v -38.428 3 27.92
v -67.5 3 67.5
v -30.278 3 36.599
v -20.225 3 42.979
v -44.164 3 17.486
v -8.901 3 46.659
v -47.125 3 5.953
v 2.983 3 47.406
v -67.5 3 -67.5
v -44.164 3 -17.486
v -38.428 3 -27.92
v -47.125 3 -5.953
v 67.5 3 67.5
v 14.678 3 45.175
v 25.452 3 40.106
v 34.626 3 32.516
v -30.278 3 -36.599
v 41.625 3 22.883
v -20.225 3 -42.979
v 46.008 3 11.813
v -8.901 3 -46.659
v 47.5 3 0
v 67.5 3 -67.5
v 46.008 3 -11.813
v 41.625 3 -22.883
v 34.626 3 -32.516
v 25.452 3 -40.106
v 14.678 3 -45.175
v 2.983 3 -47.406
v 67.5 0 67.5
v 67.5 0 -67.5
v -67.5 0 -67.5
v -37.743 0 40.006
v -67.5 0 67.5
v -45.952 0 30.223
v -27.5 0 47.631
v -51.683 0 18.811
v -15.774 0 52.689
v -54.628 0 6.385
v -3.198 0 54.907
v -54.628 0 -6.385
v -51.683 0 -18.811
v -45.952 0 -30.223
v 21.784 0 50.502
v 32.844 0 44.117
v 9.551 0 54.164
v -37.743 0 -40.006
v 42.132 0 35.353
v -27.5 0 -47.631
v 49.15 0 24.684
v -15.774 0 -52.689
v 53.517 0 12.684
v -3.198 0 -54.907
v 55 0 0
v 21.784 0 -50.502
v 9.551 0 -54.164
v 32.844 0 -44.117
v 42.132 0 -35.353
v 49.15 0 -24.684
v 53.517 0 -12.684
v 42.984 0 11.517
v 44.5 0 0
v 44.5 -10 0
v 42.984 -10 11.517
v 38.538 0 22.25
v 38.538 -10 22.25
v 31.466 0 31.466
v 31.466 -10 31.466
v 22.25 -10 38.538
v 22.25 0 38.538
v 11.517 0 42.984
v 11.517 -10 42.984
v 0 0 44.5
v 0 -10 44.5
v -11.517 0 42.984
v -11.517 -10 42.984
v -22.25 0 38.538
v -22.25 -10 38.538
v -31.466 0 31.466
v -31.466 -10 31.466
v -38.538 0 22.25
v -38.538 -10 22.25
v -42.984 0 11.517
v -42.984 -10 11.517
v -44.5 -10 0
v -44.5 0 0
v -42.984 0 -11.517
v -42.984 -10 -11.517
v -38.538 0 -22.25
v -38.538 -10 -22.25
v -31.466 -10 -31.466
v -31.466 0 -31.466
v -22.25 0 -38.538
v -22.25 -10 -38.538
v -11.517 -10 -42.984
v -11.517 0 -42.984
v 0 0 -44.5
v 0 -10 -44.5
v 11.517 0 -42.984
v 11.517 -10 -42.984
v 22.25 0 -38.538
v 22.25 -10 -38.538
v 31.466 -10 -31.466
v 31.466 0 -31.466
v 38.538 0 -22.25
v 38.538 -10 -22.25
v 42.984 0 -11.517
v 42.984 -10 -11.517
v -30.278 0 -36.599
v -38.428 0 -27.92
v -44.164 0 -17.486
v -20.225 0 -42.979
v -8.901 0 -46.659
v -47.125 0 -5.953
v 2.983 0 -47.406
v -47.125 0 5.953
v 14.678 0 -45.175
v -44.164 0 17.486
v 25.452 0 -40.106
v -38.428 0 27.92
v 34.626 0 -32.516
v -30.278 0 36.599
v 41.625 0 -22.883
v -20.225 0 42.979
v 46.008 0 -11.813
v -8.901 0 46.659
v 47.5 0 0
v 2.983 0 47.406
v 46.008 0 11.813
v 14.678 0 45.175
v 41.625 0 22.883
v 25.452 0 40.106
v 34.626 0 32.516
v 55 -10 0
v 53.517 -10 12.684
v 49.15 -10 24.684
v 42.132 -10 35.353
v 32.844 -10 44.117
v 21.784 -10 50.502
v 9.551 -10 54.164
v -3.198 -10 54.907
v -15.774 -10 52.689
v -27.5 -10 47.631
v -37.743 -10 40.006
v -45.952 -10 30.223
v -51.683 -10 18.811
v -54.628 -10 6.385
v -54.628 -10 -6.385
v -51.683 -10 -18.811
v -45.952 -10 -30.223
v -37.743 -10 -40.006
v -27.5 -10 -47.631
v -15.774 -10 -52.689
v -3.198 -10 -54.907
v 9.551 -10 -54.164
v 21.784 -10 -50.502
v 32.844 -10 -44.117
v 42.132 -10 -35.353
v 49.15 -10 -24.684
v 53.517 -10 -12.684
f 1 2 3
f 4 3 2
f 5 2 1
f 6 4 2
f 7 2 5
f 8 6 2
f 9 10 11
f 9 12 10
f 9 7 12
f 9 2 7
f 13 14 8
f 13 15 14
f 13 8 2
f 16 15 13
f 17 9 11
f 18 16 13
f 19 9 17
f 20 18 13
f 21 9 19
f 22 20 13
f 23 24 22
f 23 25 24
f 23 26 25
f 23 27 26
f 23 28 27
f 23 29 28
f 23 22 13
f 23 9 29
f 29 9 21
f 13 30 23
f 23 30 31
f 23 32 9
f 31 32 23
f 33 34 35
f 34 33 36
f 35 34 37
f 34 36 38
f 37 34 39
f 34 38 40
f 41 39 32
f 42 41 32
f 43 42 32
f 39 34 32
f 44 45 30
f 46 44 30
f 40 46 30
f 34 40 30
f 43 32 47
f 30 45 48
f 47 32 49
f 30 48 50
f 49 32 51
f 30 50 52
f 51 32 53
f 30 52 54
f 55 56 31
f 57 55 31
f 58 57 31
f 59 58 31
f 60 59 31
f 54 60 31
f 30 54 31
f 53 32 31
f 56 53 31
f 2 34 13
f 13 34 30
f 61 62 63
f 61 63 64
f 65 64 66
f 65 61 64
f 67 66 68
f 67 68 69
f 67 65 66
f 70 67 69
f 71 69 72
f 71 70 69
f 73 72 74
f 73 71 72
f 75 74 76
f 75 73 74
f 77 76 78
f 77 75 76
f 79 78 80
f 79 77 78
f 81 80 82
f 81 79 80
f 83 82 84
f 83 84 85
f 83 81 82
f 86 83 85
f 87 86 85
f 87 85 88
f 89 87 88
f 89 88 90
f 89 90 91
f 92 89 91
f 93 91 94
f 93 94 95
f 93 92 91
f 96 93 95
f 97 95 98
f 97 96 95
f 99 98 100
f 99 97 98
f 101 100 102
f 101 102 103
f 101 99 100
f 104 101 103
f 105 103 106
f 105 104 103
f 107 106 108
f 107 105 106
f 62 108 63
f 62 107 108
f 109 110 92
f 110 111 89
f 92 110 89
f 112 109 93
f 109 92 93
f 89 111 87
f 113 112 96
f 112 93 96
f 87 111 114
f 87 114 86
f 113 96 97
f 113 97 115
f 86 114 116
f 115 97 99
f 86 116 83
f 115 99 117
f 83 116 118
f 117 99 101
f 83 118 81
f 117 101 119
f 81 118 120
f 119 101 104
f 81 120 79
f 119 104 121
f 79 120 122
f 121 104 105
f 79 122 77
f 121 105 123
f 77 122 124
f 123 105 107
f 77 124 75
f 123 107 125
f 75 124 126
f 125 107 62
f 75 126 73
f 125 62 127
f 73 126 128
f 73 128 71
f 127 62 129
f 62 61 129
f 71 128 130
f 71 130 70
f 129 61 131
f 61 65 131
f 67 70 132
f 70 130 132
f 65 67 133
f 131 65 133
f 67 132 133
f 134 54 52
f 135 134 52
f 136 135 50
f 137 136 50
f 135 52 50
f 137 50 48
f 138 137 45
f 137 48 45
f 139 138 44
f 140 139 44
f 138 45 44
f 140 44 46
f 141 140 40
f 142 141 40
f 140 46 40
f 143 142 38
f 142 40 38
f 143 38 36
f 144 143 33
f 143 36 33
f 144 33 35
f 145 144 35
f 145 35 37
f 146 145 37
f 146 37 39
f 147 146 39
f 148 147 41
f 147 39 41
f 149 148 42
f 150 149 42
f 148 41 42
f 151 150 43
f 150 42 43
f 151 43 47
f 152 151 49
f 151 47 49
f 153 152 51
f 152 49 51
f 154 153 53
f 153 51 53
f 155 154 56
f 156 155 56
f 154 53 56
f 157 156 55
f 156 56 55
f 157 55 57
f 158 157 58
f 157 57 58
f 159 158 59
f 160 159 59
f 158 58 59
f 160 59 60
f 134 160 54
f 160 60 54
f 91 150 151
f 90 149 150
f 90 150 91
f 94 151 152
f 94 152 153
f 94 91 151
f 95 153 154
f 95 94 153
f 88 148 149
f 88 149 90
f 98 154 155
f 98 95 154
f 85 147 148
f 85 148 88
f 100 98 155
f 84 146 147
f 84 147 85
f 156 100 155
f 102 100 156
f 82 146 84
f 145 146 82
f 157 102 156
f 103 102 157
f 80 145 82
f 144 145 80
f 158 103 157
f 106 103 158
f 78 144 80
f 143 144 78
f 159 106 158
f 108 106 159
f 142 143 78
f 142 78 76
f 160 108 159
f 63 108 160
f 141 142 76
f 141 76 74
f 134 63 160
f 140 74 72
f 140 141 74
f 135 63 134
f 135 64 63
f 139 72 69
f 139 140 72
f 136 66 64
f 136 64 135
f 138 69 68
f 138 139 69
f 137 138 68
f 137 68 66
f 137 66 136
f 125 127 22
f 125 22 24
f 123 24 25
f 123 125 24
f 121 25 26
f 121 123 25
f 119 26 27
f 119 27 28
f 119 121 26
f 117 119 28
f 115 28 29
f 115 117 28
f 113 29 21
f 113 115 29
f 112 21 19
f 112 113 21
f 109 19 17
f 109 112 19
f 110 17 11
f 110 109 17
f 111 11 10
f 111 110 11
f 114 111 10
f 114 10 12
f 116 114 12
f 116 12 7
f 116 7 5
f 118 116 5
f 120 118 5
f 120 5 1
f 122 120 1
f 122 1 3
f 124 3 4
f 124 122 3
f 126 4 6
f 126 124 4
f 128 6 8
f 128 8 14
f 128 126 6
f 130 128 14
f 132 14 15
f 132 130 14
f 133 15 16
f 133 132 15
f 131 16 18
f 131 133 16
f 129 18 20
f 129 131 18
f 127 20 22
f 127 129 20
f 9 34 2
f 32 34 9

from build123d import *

# Parameters (mm, degrees)
SKETCH1_W           = 135
SKETCH1_H           = 135
SKETCH1_R           = 47.5
BOSS_EXTRUDE1_DEPTH = 3
SKETCH2_R           = 55
SKETCH2_R_2         = 44.5
BOSS_EXTRUDE2_DEPTH = 10


with BuildPart() as part:
    # Sketch1 → Boss-Extrude1 (new body)
    with BuildSketch(Plane(origin=(0, 0, 0), x_dir=(1, 0, 0), z_dir=(0, 1, 0))):
        Rectangle(SKETCH1_W, SKETCH1_H)
        Circle(SKETCH1_R, mode=Mode.SUBTRACT)
    extrude(amount=BOSS_EXTRUDE1_DEPTH)

    # Sketch2 → Boss-Extrude2 (add)
    with BuildSketch(Plane.XZ):
        Circle(SKETCH2_R)
        Circle(SKETCH2_R_2, mode=Mode.SUBTRACT)
    extrude(amount=BOSS_EXTRUDE2_DEPTH)


solid = part.part
